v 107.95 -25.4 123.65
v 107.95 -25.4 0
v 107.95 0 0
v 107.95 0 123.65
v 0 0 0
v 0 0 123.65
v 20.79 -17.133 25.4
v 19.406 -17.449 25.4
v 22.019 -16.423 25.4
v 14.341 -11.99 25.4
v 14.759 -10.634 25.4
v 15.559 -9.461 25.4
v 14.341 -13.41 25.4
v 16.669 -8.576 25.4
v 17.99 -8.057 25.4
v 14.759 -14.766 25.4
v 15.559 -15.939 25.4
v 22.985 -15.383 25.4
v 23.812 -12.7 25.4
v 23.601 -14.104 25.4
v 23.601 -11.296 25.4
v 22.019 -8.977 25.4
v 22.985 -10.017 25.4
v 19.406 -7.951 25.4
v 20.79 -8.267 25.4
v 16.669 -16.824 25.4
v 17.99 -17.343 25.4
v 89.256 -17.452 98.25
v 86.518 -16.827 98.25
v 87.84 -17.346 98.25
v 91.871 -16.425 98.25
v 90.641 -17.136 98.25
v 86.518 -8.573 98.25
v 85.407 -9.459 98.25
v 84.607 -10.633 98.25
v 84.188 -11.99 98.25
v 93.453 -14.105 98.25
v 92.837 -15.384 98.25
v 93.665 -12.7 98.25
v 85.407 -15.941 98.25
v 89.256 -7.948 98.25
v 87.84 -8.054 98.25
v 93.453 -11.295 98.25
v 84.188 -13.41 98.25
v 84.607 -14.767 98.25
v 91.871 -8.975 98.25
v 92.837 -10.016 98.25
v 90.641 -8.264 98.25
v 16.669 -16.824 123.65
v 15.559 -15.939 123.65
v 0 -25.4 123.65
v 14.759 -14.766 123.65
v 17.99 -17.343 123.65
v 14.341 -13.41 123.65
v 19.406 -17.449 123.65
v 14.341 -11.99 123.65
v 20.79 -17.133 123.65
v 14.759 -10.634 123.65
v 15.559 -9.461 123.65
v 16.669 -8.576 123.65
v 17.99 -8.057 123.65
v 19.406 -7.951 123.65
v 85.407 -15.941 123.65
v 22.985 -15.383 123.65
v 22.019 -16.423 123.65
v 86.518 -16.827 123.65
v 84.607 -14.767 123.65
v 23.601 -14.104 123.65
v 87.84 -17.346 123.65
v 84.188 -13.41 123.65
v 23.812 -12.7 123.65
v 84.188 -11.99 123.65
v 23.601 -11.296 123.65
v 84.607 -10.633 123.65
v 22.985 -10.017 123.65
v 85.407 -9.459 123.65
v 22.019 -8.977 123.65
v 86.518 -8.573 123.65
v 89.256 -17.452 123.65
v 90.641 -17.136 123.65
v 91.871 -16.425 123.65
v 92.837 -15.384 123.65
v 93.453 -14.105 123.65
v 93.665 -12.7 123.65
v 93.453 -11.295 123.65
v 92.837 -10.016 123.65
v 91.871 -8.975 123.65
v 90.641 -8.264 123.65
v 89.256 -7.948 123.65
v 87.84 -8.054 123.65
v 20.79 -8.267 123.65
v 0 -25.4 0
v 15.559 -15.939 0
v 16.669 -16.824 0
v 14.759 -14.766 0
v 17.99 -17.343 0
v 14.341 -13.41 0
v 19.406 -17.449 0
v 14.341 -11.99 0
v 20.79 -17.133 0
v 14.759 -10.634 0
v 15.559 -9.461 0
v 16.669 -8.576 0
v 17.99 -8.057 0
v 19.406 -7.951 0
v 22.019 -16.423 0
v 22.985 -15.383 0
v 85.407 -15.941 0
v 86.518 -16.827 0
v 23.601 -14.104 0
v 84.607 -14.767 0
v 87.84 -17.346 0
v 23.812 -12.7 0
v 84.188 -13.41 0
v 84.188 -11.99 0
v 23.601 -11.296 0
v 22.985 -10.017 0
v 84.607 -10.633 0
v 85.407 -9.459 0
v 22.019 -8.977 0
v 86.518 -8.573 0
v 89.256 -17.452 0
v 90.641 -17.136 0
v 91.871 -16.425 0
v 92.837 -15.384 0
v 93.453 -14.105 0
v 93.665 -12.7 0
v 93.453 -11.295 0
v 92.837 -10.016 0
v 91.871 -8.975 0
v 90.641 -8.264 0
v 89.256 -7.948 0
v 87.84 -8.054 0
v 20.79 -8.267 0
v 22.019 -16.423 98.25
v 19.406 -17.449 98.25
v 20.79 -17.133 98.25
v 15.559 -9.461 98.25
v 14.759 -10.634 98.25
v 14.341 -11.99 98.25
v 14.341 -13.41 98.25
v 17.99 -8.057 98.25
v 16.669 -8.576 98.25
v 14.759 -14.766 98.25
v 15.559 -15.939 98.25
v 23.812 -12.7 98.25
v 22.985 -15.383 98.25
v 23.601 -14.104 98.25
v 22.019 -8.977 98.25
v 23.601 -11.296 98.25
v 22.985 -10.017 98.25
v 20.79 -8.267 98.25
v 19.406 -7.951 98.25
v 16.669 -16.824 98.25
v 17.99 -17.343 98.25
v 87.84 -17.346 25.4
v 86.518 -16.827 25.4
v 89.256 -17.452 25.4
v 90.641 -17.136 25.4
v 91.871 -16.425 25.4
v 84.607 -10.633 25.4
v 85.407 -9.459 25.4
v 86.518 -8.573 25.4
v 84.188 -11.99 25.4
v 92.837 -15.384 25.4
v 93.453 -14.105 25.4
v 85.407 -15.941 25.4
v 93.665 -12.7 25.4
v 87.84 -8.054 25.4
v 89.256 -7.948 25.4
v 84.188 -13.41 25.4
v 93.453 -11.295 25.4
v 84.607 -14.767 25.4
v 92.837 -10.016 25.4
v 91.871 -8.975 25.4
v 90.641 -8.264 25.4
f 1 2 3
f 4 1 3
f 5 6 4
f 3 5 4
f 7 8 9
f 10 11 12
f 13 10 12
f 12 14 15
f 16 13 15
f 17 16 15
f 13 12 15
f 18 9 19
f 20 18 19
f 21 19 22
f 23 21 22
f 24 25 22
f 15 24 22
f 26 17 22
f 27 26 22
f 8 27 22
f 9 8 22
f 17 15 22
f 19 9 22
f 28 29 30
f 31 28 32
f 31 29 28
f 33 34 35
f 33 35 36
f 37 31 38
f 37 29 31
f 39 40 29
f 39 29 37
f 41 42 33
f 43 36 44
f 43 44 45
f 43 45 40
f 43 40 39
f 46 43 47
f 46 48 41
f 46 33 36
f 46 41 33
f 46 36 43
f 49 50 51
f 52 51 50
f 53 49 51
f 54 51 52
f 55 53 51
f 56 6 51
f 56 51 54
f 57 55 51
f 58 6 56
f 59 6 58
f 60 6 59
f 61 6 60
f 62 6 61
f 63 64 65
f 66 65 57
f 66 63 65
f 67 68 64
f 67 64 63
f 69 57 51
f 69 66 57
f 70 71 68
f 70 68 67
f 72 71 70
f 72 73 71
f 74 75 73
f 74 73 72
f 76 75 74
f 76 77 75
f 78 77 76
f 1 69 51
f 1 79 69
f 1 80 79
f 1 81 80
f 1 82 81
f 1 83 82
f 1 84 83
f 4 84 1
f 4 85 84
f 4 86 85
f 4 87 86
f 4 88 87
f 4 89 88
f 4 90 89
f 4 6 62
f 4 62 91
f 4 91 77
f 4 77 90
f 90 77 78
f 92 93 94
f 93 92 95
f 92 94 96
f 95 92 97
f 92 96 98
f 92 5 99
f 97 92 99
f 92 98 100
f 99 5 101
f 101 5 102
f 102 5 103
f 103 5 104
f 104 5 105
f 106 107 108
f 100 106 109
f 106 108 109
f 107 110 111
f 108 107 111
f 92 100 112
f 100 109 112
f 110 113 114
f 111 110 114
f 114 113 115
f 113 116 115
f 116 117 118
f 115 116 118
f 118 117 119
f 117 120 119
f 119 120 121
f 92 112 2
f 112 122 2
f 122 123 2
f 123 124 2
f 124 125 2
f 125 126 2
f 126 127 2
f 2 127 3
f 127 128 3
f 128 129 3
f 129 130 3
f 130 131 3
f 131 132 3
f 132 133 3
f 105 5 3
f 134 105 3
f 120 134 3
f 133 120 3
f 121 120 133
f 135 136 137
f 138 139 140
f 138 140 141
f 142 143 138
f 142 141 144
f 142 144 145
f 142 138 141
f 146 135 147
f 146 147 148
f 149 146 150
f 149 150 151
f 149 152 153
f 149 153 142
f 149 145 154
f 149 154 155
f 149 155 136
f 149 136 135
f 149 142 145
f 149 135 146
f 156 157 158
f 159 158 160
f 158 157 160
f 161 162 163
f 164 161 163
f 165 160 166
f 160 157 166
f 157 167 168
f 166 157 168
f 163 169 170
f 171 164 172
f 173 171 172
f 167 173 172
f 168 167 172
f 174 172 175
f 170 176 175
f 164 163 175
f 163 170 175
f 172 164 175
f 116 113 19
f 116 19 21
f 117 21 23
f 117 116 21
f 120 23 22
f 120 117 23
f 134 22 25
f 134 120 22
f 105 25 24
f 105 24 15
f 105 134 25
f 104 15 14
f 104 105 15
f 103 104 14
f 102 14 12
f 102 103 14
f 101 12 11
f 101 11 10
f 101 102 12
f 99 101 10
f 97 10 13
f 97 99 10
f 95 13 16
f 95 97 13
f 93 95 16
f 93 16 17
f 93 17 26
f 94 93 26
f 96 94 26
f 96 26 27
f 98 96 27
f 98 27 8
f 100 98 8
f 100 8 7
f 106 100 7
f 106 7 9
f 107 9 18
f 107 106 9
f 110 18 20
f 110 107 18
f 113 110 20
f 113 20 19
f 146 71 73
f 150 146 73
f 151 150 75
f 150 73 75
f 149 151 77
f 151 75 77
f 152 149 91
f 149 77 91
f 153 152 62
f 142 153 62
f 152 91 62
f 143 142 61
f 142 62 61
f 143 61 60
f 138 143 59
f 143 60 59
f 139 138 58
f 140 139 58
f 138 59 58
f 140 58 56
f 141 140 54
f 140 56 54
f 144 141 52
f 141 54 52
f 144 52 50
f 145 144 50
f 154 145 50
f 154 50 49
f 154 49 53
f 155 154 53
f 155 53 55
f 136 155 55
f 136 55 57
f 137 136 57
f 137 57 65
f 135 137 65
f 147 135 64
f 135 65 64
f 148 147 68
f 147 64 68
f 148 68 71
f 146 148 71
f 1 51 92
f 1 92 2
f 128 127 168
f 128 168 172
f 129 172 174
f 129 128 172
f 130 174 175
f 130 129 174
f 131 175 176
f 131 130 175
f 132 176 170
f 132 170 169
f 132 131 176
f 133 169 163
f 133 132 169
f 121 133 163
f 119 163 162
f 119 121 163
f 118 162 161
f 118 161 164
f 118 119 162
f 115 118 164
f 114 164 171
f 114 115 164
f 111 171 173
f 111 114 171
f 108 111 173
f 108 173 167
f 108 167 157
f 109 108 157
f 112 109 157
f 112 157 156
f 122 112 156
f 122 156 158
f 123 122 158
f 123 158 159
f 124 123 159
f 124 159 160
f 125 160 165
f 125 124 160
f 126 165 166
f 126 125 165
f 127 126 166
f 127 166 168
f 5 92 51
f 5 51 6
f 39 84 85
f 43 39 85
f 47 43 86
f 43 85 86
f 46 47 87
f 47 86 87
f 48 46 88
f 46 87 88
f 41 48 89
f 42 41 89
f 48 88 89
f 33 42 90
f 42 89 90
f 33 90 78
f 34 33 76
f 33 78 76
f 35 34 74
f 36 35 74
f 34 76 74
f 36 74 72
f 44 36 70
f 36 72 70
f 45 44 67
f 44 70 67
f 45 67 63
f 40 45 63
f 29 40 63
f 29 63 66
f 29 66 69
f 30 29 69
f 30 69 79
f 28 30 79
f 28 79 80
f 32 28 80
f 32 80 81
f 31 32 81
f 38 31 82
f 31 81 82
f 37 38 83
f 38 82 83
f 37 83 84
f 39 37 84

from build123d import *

# Parameters (mm, degrees)
SKETCH1_W           = 107.95
SKETCH1_H           = 25.4
BOSS_EXTRUDE1_DEPTH = 123.65
SKETCH2_R           = 4.7625
SKETCH2_R_2         = 4.765
CUT_EXTRUDE1_DEPTH  = 25.4


with BuildPart() as part:
    # Sketch1 → Boss-Extrude1 (new body)
    with BuildSketch(Plane.XY):
        with Locations((53.975, -12.7)):
            Rectangle(SKETCH1_W, SKETCH1_H)
    extrude(amount=BOSS_EXTRUDE1_DEPTH)

    # Sketch2 → Cut-Extrude1 (cut)
    with BuildSketch(Plane.XY.offset(123.65)):
        with Locations((19.05, -12.7)):
            Circle(SKETCH2_R)
        with Locations((88.9, -12.7)):
            Circle(SKETCH2_R_2)
    cut_extrude1 = extrude(amount=-CUT_EXTRUDE1_DEPTH, mode=Mode.SUBTRACT)

    # Mirror1: Cut-Extrude1 across plane
    add(cut_extrude1.mirror(Plane.XY.offset(61.825)), mode=Mode.SUBTRACT)


solid = part.part
